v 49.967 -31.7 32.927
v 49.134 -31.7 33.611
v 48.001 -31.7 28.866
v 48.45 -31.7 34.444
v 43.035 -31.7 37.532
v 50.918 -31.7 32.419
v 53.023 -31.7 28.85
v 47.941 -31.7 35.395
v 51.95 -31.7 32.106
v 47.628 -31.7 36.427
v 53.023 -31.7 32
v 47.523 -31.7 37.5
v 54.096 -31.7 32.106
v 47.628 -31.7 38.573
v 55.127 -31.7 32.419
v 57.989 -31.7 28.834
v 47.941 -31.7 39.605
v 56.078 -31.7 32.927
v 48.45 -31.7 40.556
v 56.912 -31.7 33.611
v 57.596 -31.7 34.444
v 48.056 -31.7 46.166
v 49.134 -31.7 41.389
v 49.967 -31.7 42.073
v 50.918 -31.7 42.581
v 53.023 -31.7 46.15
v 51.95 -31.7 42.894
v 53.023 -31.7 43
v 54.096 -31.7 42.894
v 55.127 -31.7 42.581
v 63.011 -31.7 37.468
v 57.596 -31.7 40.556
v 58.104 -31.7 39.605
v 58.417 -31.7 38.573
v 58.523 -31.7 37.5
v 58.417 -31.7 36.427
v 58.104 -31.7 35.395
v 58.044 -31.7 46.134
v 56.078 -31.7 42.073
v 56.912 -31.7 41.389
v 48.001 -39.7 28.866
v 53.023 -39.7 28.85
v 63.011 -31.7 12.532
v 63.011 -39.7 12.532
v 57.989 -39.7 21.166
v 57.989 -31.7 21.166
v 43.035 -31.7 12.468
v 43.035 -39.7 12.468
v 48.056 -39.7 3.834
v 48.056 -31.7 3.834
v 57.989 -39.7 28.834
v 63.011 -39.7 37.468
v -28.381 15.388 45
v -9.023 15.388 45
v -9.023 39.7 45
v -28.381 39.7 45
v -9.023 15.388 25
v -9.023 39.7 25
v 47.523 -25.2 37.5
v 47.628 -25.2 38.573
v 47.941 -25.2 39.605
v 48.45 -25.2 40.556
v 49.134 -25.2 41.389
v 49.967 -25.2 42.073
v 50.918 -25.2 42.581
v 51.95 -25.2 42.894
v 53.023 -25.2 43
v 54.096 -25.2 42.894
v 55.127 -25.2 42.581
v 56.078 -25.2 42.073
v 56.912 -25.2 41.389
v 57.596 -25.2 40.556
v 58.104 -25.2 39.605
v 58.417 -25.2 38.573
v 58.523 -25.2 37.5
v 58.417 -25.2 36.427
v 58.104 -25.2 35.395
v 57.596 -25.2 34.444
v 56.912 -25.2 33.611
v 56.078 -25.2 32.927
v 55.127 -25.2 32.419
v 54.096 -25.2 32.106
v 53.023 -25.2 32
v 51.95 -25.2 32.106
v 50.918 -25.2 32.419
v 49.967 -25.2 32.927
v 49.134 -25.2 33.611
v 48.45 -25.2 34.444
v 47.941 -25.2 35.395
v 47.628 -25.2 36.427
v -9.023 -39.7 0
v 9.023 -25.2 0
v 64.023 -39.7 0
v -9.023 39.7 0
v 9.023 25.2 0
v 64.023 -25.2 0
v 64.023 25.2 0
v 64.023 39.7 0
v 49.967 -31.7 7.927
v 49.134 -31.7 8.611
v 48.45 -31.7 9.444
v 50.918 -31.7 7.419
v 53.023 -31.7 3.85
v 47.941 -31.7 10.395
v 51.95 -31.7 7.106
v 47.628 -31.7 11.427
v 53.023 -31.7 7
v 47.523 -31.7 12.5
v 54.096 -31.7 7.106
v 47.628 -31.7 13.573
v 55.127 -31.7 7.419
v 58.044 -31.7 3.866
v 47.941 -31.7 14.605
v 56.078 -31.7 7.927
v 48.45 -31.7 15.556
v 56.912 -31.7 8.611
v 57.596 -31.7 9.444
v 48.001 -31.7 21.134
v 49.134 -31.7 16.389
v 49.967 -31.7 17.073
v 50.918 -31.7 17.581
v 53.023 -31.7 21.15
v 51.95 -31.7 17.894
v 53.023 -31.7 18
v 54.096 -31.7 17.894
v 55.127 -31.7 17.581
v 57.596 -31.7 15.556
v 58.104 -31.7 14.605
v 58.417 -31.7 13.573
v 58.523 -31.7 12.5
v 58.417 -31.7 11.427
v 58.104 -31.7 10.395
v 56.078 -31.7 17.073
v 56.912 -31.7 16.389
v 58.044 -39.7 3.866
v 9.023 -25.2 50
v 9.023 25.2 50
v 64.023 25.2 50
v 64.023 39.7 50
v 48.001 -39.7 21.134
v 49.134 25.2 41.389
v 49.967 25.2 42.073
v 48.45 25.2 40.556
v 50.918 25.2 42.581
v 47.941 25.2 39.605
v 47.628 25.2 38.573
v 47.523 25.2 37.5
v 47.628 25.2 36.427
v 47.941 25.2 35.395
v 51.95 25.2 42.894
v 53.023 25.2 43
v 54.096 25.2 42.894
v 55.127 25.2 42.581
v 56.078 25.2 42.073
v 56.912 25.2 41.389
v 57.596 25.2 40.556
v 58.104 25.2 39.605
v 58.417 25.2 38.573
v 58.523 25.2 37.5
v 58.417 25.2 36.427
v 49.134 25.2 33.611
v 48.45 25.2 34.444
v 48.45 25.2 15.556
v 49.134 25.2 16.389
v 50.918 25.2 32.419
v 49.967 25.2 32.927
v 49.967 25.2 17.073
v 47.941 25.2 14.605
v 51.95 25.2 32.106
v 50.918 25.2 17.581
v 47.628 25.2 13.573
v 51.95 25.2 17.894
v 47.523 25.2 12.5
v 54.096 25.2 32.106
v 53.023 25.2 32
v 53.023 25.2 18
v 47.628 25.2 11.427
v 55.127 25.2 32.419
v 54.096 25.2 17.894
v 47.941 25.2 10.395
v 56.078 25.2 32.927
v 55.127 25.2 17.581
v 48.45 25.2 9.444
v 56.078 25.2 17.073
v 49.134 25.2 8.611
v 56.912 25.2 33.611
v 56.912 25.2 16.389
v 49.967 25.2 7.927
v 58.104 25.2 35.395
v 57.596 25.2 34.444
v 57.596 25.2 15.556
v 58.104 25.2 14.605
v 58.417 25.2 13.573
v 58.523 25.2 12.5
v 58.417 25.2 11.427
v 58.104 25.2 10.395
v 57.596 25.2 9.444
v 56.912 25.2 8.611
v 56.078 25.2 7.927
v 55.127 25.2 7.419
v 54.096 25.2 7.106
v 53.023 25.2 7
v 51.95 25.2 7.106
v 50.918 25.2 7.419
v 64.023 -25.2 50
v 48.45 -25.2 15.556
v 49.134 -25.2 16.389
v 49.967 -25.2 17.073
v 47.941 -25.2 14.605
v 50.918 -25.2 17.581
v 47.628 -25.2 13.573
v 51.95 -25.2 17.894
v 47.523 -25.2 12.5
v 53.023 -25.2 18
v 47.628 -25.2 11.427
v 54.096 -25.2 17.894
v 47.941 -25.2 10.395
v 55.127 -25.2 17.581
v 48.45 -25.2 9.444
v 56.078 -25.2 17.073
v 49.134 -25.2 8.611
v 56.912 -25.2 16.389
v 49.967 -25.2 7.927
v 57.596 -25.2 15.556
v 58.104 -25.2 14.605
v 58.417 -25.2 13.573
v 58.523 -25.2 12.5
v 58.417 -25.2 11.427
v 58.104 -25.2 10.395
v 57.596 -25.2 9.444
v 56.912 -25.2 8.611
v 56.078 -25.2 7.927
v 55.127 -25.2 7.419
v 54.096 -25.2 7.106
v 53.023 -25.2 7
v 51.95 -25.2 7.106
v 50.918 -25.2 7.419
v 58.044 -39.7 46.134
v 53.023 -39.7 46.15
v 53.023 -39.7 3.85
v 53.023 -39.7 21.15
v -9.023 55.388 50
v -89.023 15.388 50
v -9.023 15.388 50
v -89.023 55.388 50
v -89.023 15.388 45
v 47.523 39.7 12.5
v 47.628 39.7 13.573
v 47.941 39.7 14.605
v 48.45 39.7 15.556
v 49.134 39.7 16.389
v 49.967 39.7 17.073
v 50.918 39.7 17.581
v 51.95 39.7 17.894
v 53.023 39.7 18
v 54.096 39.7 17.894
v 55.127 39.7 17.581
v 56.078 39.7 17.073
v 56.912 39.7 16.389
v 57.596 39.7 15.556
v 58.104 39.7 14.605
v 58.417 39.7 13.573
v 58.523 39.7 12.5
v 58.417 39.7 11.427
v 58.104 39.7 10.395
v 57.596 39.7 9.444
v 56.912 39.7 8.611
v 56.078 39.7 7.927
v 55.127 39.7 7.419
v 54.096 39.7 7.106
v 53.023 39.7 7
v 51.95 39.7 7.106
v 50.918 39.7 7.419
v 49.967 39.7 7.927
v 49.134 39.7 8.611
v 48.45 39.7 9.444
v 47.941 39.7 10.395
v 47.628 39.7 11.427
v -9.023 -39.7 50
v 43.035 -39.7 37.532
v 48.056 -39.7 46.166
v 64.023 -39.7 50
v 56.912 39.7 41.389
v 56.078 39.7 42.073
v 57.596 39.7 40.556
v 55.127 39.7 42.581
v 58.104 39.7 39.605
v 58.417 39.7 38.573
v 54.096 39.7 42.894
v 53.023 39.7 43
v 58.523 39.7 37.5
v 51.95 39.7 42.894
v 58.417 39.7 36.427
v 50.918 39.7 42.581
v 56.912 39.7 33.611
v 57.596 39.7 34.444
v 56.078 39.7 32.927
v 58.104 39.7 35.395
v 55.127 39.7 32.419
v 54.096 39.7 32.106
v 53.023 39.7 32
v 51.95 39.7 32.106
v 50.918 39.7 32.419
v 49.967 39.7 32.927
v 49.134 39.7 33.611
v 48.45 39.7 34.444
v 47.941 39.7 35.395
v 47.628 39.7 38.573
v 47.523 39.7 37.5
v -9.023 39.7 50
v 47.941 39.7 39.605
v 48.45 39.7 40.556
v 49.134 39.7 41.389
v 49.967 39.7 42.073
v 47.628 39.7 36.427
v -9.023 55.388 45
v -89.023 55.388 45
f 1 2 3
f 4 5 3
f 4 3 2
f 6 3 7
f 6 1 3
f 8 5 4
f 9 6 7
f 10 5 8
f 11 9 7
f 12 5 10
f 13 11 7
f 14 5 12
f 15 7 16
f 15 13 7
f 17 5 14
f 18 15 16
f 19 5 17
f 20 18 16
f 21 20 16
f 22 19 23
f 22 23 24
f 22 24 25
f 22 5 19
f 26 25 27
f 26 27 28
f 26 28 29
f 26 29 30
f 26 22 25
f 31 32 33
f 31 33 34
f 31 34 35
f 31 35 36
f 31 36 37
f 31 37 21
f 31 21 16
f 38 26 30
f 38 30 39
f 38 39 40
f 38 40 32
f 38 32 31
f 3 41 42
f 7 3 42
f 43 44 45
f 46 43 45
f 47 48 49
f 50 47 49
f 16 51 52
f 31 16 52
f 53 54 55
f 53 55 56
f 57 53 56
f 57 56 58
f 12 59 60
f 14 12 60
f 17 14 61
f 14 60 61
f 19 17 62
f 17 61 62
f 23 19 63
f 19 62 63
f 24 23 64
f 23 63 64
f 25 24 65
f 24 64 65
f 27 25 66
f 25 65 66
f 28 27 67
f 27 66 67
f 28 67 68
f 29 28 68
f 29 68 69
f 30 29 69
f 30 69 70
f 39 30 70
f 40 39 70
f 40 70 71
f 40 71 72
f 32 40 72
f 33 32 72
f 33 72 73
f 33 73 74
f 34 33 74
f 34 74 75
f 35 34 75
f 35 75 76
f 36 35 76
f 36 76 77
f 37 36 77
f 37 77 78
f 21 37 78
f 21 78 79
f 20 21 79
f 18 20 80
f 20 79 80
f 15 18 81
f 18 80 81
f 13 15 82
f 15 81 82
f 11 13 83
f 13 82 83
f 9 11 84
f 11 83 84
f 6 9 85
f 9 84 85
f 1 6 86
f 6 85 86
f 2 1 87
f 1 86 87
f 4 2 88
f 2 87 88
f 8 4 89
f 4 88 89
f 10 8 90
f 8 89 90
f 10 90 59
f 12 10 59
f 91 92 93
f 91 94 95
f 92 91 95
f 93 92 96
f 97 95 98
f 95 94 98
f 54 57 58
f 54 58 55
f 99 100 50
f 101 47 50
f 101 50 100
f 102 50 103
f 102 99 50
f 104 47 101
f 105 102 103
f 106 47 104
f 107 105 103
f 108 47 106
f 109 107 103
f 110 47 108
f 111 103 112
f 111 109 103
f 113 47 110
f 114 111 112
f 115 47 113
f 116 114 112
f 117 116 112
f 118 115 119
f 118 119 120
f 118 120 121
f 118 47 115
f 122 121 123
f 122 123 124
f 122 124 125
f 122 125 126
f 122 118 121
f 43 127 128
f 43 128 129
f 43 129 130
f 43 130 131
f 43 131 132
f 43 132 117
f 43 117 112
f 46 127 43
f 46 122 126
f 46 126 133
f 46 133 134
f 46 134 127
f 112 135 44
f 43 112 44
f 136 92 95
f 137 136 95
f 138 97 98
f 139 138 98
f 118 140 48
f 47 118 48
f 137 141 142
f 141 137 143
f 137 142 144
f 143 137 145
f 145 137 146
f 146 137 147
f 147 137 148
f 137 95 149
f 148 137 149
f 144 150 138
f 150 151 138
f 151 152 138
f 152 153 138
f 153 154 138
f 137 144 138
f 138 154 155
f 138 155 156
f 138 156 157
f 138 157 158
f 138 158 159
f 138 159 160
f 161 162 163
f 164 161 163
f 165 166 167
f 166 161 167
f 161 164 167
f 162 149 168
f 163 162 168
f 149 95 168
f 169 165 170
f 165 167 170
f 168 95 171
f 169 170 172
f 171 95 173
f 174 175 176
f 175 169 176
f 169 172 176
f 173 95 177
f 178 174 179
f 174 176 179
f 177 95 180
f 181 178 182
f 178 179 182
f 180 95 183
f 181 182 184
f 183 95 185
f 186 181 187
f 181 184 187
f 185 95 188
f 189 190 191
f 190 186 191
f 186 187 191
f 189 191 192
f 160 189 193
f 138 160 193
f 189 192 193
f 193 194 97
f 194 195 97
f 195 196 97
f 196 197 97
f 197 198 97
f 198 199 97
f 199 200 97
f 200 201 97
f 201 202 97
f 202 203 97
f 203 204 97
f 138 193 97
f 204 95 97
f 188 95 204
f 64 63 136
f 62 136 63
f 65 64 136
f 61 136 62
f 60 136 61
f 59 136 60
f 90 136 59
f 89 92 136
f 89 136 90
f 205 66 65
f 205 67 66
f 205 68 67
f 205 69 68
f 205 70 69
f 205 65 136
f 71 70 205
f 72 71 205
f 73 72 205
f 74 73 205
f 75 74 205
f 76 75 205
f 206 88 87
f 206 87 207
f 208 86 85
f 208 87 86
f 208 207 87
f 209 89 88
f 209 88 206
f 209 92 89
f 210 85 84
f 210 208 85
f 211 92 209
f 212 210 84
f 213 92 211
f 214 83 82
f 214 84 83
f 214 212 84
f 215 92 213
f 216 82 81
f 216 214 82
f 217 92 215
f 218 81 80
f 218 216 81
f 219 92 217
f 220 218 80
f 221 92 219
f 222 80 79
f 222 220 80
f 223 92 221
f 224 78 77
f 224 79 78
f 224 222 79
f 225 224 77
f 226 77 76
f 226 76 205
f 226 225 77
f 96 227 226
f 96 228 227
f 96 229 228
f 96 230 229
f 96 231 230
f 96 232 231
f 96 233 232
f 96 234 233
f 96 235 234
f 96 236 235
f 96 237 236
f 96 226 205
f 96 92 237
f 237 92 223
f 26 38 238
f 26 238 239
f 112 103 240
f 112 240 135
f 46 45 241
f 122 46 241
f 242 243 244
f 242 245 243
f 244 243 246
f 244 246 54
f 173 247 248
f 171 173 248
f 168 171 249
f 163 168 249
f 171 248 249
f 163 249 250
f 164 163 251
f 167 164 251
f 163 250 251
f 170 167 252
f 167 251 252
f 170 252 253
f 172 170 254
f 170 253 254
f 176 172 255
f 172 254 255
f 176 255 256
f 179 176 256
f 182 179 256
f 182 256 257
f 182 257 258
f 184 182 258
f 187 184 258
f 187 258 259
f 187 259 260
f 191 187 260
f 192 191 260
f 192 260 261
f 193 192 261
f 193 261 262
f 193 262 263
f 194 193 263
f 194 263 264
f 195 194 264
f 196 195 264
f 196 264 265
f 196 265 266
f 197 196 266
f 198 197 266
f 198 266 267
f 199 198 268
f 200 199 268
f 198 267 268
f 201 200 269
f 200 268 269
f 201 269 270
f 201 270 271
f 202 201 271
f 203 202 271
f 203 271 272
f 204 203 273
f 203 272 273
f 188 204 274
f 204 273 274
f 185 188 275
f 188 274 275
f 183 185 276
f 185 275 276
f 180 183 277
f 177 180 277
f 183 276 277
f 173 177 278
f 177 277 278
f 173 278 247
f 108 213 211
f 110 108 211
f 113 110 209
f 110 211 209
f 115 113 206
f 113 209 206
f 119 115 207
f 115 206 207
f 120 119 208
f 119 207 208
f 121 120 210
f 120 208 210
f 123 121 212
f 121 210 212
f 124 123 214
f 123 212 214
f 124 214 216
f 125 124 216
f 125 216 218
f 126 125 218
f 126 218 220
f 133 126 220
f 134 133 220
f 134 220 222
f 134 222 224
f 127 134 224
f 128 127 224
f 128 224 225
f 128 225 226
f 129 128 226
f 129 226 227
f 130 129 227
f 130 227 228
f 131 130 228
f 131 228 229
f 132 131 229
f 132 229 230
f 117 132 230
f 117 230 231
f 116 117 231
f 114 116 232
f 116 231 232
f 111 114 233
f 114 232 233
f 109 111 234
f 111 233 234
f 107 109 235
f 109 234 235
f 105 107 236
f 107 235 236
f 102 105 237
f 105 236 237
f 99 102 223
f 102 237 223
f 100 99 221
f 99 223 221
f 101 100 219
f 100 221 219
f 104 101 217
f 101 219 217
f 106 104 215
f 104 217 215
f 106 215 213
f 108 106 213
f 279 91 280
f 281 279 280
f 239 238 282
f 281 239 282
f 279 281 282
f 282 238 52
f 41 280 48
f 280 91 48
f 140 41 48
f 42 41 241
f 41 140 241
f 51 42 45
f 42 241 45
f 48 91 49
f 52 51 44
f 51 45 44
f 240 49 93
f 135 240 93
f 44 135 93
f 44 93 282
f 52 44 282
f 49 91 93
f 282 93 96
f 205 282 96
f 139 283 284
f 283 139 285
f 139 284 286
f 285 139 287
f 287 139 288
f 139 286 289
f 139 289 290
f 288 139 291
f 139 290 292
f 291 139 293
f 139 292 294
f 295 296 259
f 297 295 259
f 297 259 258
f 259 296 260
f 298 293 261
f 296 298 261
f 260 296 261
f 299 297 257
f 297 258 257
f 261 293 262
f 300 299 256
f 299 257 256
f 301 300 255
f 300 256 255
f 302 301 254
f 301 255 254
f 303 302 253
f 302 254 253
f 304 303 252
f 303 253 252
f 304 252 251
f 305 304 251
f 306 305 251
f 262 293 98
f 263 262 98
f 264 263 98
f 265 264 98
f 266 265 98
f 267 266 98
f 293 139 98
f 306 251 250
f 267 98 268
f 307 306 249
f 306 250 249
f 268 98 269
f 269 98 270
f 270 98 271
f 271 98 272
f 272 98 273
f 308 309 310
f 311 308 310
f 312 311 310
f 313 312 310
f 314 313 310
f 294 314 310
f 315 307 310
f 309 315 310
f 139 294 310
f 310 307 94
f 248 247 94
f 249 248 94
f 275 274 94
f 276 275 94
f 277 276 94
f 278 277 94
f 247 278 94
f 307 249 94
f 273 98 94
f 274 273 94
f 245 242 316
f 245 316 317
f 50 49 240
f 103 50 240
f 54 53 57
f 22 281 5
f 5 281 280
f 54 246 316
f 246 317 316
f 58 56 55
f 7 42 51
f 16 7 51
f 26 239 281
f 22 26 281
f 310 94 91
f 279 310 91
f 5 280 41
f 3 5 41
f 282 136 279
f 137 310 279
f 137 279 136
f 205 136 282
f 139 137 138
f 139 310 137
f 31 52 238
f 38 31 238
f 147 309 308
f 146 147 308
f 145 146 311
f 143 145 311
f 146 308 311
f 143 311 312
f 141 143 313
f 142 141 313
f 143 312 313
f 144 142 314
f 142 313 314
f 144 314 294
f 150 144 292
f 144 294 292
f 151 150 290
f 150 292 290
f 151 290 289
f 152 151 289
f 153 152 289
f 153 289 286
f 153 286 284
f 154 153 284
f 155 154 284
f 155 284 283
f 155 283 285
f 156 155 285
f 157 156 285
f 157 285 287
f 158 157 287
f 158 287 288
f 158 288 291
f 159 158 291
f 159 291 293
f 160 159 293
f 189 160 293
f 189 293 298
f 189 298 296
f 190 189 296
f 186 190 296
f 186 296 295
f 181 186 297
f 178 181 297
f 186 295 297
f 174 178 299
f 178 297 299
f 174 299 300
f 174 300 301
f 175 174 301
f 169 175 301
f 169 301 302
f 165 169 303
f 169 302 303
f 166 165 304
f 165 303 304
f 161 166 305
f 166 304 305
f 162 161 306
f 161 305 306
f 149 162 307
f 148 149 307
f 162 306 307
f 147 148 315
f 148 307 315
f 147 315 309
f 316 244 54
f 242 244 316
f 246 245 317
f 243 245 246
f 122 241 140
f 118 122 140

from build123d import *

# Parameters (mm, degrees)
F0_W     = 55
F0_H     = 14.5
F1_DEPTH = 50
F3_D     = 11
F5_DEPTH = 5
F7_START = -55.0882827309
F7_DEPTH = 24.3117172691
F8_DEPTH = 8


with BuildPart() as f1:
    # F0 (on Top) → F1 (new body)
    with BuildSketch(Plane.XY):
        Polygon((9.0226443761, 25.2), (9.0226443761, 39.7), (-9.0226443761, 39.7), (-9.0226443761, -39.7), (9.0226443761, -39.7), (9.0226443761, -25.2), align=None)
        with Locations((36.5226443761, 32.45)):
            Rectangle(F0_W, F0_H)
        with Locations((36.5226443761, -32.45)):
            Rectangle(F0_W, F0_H)
    extrude(amount=F1_DEPTH)

    # F3 (through all)
    with Locations(Plane.XZ.offset(39.7)):
        with Locations((53.0226443761, 37.5), (53.0226443761, 12.5)):
            Hole(F3_D / 2)

    # F2 (on face) → F8 (cut)
    with BuildSketch(Plane.XZ.offset(39.7)):
        Polygon((48.0009722306, 28.8659892172), (53.0226443761, 28.8499559106), (53.0226443761, 46.1500440894), (48.0562077744, 46.1659010388), (43.0345356289, 37.5318902561), align=None)
        Polygon((53.0226443761, 46.1500440894), (53.0226443761, 28.8499559106), (57.9890809777, 28.8340989612), (63.0107531232, 37.4681097439), (58.0443165215, 46.1340107828), align=None)
        Polygon((57.9890809777, 21.1659010388), (53.0226443761, 21.1500440894), (53.0226443761, 3.8499559106), (58.0443165215, 3.8659892172), (63.0107531232, 12.5318902561), align=None)
        Polygon((53.0226443761, 3.8499559106), (53.0226443761, 21.1500440894), (48.0009722306, 21.1340107827), (43.0345356289, 12.4681097439), (48.0562077744, 3.8340989612), align=None)
    extrude(amount=-F8_DEPTH, mode=Mode.SUBTRACT)


with BuildPart() as f5:
    # F4 (on face) → F5 (new body)
    with BuildSketch(Plane.XY.offset(50)):
        Polygon((-89.0226443761, 15.3882827309), (-9.0226443761, 15.3882827309), (-9.0226443761, 39.7), (-9.0226443761, 55.3882827309), (-89.0226443761, 55.3882827309), align=None)
    extrude(amount=-F5_DEPTH)


with BuildPart() as f7:
    # F6 (on face) → F7 (new body)
    with BuildSketch(Plane.XZ.offset(39.7).offset(F7_START)):
        Polygon((-9.0226443761, 25), (-9.0226443761, 45), (-28.3809173852, 45), align=None)
    extrude(amount=-F7_DEPTH)


solid = Compound([f1.part, f5.part, f7.part])
